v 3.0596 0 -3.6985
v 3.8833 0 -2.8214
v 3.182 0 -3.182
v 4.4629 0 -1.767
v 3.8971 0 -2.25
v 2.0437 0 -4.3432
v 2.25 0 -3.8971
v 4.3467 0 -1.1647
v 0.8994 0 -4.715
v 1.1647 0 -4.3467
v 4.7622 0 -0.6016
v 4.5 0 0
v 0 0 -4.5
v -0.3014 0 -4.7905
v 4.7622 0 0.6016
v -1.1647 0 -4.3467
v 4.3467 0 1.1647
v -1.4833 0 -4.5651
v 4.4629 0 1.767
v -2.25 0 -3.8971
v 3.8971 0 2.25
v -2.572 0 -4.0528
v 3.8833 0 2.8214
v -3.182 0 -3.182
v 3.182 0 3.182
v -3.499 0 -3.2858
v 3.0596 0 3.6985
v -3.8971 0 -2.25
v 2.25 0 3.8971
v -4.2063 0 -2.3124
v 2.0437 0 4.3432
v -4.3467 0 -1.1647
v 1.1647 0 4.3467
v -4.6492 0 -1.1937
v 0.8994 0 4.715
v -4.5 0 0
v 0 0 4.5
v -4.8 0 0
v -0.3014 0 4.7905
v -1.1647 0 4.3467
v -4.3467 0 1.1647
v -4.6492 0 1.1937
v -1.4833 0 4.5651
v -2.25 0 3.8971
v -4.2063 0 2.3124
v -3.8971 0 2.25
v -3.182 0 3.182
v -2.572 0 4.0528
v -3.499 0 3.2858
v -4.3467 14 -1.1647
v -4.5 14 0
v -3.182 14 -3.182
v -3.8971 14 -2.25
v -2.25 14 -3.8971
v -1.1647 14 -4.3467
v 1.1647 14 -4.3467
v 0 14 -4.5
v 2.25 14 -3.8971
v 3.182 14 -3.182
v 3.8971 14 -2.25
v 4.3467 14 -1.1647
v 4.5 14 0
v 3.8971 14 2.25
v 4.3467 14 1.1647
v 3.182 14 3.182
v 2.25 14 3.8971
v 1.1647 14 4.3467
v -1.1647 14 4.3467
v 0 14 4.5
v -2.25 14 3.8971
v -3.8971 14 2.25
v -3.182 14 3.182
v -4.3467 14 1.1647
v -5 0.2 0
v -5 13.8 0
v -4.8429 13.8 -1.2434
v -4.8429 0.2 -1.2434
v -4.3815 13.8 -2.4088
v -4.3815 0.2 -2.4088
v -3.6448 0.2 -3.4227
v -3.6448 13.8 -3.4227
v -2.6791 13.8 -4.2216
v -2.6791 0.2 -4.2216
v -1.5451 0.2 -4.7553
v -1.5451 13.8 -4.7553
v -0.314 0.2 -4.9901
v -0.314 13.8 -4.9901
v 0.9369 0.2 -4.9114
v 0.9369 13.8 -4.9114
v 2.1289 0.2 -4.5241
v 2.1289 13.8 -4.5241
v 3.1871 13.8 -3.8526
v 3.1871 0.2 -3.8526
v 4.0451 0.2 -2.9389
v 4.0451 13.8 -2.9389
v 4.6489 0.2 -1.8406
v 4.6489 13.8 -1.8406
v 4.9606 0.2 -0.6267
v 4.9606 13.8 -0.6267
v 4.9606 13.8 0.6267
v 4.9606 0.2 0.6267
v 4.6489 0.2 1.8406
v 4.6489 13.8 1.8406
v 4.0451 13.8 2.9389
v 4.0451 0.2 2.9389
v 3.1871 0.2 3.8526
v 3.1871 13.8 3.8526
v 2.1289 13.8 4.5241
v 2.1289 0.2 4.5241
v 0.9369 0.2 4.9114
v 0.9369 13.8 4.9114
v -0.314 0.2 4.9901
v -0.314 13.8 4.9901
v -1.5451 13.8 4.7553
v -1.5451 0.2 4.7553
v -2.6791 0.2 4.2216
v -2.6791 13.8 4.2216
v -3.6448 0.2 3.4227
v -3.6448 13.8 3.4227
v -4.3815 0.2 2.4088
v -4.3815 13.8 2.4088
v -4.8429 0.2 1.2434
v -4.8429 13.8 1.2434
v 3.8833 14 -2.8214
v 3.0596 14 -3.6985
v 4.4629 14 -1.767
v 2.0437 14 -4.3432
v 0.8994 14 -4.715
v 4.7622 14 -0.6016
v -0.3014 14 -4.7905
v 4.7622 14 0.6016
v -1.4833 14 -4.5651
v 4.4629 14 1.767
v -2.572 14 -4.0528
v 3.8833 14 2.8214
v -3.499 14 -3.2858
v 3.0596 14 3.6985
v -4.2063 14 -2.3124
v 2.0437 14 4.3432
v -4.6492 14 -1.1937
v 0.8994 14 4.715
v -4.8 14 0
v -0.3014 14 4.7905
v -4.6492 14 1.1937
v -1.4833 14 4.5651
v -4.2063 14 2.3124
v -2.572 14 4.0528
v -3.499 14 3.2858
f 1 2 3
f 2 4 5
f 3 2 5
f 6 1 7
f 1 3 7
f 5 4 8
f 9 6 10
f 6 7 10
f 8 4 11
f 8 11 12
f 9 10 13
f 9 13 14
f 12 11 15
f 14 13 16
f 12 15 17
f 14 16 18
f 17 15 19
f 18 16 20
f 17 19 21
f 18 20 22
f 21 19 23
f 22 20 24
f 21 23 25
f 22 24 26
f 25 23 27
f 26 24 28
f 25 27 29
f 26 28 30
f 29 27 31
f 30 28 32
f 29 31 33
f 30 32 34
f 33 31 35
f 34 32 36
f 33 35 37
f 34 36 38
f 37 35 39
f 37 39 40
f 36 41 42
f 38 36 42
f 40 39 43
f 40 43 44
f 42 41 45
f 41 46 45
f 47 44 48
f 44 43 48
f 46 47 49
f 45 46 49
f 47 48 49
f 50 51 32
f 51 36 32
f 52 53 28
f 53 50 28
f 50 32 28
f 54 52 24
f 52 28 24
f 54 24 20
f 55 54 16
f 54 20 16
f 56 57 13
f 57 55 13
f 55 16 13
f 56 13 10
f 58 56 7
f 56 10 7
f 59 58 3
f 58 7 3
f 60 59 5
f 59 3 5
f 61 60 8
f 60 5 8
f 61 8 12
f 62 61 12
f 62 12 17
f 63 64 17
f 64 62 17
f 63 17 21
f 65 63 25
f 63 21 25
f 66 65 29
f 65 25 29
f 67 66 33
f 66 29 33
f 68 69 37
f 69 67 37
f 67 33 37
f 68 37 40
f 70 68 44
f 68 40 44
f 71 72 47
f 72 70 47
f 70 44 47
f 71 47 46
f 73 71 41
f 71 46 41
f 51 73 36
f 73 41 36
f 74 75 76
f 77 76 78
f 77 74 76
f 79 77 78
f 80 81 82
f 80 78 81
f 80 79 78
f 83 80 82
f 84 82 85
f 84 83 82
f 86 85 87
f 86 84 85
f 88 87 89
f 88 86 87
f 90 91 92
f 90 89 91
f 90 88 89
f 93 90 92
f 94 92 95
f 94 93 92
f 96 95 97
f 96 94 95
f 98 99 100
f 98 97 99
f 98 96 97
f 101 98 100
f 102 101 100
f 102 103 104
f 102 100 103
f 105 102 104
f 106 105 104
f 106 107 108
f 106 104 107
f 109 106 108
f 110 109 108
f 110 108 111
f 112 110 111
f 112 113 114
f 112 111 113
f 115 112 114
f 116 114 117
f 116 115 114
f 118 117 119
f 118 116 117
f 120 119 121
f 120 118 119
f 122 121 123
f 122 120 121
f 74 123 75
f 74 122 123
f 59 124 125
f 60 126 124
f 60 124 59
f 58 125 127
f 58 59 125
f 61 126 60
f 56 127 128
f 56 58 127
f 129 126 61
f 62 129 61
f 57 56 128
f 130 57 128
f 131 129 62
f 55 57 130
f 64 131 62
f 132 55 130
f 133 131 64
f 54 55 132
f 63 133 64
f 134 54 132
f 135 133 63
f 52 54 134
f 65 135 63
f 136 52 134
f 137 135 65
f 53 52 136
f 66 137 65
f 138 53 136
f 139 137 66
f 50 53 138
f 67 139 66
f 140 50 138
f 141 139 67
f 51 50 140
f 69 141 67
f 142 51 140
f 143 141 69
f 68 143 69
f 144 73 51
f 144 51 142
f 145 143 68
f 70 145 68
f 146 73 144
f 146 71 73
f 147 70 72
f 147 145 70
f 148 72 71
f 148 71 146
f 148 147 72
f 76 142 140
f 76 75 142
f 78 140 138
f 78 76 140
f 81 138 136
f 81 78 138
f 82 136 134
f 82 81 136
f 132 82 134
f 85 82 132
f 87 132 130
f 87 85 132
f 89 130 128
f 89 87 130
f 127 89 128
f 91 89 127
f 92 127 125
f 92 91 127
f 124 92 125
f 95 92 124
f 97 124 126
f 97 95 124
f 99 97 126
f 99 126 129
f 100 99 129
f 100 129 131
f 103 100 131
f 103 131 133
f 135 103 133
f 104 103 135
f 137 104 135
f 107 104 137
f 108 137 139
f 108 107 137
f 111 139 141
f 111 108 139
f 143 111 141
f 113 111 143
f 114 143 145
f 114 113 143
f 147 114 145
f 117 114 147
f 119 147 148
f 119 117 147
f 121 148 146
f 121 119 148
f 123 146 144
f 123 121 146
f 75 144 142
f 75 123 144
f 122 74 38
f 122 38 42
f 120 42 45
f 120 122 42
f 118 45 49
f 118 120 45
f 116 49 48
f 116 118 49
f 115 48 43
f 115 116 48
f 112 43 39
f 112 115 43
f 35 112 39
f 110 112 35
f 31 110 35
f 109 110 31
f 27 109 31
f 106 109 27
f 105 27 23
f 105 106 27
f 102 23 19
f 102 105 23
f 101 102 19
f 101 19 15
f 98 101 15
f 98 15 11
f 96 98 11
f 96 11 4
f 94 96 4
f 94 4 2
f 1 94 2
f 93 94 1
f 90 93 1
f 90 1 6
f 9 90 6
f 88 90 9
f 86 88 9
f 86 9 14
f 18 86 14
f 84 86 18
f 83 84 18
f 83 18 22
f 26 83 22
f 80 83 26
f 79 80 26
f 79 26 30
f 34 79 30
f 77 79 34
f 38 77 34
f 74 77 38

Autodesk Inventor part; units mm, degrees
ref_plane "YZ Plane" through (0, 0, 0) normal (1, 0, 0) x (0, 1, 0)
ref_plane "XZ Plane" through (0, 0, 0) normal (0, 1, 0) x (-1, 0, 0)
ref_plane "XY Plane" through (0, 0, 0) normal (0, 0, 1) x (1, 0, 0)
sketch "Sketch1" plane through (0, 0, 0) normal (0, 1, 0) x (-1, 0, 0)
  circle A0 centre (0, 0) radius 5
  circle A1 centre (0, 0) radius 4.5
  dimension "d0" = 10
  dimension "d1" = 9
extrude "Extrusion1" add sketch "Sketch1" along normal blind 14
chamfer "Chamfer1" distance 0.2 angle 45 1 edges at (5, 14, 0)
chamfer "Chamfer2" distance 0.2 angle 45 1 edges at (5, 0, 0)
properties material "Acetal Resin, Black"
